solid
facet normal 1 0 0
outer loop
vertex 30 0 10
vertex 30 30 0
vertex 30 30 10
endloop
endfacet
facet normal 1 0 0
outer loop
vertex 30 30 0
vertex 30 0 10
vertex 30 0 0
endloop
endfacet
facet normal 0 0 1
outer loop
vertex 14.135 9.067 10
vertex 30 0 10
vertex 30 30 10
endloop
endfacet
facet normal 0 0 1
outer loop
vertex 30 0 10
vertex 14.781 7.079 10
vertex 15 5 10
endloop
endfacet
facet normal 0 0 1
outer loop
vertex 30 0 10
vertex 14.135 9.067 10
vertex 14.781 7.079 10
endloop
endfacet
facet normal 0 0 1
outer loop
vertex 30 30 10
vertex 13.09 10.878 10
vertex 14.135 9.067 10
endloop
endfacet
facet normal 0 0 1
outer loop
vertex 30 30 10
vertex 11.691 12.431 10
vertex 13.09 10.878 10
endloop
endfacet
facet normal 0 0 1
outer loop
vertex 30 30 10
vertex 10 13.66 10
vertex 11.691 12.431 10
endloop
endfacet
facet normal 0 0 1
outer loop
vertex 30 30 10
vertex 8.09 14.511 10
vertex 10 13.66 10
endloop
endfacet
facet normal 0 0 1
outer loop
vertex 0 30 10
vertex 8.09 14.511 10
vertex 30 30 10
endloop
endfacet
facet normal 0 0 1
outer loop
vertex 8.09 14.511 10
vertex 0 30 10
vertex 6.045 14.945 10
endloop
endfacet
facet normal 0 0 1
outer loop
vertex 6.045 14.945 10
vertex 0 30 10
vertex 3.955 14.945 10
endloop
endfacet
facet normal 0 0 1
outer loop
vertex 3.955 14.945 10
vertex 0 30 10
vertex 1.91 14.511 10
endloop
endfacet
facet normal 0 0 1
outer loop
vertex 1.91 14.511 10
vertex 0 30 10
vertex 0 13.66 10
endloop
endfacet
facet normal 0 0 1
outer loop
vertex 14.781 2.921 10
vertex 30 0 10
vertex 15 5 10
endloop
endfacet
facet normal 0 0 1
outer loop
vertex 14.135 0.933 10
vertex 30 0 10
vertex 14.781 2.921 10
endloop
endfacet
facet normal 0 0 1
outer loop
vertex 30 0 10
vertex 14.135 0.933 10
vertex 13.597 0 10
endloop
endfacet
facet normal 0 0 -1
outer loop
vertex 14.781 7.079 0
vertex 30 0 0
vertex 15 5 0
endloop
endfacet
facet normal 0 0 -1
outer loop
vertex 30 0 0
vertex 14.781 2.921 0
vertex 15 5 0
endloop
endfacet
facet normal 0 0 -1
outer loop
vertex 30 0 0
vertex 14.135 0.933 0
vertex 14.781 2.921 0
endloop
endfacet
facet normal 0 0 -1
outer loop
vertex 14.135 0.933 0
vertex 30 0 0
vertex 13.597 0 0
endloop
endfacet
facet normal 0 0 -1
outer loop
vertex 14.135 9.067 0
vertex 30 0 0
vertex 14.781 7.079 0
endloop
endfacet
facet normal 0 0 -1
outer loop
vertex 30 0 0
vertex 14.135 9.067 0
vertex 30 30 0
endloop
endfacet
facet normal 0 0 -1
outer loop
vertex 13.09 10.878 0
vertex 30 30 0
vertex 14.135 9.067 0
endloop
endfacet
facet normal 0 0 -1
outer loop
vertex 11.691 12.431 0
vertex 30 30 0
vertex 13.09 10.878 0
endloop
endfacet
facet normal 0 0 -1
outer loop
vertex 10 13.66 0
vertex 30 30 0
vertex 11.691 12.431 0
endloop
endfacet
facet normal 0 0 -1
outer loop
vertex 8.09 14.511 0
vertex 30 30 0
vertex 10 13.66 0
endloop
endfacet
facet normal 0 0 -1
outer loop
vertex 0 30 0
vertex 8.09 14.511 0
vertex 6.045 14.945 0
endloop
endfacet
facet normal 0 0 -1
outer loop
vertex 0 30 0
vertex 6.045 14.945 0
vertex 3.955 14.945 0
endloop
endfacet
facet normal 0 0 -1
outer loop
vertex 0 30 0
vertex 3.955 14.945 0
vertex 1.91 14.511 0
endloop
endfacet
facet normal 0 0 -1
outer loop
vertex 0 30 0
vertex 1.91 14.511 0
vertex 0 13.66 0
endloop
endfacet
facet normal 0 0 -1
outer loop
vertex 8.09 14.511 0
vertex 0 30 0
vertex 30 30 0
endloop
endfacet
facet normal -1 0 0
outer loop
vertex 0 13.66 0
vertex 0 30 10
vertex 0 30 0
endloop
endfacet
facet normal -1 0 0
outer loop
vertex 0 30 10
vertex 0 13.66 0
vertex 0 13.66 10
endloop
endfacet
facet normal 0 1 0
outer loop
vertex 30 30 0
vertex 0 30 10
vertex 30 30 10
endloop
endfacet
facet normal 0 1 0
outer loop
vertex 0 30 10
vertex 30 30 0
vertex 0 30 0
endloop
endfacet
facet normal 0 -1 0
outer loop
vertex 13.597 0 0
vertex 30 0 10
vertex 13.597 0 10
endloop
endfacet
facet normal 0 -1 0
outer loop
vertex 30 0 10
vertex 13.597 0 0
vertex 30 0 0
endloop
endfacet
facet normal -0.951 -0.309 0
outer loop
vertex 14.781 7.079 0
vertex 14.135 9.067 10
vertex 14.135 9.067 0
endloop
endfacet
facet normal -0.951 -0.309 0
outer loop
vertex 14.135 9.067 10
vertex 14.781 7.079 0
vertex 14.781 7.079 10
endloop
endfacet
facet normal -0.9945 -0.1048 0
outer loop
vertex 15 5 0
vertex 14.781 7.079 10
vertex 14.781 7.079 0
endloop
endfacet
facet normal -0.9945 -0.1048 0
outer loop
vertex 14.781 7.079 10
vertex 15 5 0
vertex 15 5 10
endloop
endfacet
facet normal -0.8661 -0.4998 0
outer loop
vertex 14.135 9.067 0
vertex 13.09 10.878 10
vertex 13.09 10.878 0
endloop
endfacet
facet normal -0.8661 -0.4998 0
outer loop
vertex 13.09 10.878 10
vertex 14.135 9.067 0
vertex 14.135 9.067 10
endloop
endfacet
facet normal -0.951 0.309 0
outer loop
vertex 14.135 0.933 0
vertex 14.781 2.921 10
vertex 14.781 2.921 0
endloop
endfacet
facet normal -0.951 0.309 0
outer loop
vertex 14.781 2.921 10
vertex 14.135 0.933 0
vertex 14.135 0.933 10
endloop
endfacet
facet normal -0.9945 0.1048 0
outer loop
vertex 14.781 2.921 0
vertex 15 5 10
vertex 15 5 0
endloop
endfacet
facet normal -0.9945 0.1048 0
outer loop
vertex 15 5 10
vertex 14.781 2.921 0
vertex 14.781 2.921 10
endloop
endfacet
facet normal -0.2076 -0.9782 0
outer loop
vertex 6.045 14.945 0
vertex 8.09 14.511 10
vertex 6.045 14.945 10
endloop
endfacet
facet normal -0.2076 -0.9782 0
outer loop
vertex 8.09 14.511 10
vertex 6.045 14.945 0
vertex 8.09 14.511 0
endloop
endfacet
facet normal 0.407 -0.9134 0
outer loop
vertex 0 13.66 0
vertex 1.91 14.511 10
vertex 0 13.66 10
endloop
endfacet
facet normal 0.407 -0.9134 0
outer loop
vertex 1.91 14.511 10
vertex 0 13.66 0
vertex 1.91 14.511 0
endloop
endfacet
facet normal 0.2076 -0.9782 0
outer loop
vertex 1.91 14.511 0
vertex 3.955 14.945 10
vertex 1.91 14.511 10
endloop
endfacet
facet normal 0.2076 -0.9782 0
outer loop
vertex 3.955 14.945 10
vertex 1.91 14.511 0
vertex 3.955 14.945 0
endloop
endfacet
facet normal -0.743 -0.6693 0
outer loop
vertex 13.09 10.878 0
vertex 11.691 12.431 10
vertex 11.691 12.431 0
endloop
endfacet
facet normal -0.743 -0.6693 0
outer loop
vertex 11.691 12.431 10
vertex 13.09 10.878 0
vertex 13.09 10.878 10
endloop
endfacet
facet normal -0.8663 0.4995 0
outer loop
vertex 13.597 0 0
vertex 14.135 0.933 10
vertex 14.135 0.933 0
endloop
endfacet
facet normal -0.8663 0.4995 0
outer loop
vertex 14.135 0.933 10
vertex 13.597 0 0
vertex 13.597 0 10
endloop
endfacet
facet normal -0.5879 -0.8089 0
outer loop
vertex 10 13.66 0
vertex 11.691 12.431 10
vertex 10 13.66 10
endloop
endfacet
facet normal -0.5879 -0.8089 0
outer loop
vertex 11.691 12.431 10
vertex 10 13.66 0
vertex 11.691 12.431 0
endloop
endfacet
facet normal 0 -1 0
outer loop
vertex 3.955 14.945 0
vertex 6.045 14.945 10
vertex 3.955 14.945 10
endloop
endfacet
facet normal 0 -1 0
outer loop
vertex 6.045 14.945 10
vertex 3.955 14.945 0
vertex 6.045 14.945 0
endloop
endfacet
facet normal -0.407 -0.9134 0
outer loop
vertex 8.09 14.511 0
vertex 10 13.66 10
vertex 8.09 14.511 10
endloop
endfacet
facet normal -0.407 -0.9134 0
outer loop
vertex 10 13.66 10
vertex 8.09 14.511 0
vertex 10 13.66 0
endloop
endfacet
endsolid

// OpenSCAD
difference() {
    cube([30, 30, 10]); // Base
    translate([5, 5, -1]) cylinder(h=12, r=10); // Agujero
}
